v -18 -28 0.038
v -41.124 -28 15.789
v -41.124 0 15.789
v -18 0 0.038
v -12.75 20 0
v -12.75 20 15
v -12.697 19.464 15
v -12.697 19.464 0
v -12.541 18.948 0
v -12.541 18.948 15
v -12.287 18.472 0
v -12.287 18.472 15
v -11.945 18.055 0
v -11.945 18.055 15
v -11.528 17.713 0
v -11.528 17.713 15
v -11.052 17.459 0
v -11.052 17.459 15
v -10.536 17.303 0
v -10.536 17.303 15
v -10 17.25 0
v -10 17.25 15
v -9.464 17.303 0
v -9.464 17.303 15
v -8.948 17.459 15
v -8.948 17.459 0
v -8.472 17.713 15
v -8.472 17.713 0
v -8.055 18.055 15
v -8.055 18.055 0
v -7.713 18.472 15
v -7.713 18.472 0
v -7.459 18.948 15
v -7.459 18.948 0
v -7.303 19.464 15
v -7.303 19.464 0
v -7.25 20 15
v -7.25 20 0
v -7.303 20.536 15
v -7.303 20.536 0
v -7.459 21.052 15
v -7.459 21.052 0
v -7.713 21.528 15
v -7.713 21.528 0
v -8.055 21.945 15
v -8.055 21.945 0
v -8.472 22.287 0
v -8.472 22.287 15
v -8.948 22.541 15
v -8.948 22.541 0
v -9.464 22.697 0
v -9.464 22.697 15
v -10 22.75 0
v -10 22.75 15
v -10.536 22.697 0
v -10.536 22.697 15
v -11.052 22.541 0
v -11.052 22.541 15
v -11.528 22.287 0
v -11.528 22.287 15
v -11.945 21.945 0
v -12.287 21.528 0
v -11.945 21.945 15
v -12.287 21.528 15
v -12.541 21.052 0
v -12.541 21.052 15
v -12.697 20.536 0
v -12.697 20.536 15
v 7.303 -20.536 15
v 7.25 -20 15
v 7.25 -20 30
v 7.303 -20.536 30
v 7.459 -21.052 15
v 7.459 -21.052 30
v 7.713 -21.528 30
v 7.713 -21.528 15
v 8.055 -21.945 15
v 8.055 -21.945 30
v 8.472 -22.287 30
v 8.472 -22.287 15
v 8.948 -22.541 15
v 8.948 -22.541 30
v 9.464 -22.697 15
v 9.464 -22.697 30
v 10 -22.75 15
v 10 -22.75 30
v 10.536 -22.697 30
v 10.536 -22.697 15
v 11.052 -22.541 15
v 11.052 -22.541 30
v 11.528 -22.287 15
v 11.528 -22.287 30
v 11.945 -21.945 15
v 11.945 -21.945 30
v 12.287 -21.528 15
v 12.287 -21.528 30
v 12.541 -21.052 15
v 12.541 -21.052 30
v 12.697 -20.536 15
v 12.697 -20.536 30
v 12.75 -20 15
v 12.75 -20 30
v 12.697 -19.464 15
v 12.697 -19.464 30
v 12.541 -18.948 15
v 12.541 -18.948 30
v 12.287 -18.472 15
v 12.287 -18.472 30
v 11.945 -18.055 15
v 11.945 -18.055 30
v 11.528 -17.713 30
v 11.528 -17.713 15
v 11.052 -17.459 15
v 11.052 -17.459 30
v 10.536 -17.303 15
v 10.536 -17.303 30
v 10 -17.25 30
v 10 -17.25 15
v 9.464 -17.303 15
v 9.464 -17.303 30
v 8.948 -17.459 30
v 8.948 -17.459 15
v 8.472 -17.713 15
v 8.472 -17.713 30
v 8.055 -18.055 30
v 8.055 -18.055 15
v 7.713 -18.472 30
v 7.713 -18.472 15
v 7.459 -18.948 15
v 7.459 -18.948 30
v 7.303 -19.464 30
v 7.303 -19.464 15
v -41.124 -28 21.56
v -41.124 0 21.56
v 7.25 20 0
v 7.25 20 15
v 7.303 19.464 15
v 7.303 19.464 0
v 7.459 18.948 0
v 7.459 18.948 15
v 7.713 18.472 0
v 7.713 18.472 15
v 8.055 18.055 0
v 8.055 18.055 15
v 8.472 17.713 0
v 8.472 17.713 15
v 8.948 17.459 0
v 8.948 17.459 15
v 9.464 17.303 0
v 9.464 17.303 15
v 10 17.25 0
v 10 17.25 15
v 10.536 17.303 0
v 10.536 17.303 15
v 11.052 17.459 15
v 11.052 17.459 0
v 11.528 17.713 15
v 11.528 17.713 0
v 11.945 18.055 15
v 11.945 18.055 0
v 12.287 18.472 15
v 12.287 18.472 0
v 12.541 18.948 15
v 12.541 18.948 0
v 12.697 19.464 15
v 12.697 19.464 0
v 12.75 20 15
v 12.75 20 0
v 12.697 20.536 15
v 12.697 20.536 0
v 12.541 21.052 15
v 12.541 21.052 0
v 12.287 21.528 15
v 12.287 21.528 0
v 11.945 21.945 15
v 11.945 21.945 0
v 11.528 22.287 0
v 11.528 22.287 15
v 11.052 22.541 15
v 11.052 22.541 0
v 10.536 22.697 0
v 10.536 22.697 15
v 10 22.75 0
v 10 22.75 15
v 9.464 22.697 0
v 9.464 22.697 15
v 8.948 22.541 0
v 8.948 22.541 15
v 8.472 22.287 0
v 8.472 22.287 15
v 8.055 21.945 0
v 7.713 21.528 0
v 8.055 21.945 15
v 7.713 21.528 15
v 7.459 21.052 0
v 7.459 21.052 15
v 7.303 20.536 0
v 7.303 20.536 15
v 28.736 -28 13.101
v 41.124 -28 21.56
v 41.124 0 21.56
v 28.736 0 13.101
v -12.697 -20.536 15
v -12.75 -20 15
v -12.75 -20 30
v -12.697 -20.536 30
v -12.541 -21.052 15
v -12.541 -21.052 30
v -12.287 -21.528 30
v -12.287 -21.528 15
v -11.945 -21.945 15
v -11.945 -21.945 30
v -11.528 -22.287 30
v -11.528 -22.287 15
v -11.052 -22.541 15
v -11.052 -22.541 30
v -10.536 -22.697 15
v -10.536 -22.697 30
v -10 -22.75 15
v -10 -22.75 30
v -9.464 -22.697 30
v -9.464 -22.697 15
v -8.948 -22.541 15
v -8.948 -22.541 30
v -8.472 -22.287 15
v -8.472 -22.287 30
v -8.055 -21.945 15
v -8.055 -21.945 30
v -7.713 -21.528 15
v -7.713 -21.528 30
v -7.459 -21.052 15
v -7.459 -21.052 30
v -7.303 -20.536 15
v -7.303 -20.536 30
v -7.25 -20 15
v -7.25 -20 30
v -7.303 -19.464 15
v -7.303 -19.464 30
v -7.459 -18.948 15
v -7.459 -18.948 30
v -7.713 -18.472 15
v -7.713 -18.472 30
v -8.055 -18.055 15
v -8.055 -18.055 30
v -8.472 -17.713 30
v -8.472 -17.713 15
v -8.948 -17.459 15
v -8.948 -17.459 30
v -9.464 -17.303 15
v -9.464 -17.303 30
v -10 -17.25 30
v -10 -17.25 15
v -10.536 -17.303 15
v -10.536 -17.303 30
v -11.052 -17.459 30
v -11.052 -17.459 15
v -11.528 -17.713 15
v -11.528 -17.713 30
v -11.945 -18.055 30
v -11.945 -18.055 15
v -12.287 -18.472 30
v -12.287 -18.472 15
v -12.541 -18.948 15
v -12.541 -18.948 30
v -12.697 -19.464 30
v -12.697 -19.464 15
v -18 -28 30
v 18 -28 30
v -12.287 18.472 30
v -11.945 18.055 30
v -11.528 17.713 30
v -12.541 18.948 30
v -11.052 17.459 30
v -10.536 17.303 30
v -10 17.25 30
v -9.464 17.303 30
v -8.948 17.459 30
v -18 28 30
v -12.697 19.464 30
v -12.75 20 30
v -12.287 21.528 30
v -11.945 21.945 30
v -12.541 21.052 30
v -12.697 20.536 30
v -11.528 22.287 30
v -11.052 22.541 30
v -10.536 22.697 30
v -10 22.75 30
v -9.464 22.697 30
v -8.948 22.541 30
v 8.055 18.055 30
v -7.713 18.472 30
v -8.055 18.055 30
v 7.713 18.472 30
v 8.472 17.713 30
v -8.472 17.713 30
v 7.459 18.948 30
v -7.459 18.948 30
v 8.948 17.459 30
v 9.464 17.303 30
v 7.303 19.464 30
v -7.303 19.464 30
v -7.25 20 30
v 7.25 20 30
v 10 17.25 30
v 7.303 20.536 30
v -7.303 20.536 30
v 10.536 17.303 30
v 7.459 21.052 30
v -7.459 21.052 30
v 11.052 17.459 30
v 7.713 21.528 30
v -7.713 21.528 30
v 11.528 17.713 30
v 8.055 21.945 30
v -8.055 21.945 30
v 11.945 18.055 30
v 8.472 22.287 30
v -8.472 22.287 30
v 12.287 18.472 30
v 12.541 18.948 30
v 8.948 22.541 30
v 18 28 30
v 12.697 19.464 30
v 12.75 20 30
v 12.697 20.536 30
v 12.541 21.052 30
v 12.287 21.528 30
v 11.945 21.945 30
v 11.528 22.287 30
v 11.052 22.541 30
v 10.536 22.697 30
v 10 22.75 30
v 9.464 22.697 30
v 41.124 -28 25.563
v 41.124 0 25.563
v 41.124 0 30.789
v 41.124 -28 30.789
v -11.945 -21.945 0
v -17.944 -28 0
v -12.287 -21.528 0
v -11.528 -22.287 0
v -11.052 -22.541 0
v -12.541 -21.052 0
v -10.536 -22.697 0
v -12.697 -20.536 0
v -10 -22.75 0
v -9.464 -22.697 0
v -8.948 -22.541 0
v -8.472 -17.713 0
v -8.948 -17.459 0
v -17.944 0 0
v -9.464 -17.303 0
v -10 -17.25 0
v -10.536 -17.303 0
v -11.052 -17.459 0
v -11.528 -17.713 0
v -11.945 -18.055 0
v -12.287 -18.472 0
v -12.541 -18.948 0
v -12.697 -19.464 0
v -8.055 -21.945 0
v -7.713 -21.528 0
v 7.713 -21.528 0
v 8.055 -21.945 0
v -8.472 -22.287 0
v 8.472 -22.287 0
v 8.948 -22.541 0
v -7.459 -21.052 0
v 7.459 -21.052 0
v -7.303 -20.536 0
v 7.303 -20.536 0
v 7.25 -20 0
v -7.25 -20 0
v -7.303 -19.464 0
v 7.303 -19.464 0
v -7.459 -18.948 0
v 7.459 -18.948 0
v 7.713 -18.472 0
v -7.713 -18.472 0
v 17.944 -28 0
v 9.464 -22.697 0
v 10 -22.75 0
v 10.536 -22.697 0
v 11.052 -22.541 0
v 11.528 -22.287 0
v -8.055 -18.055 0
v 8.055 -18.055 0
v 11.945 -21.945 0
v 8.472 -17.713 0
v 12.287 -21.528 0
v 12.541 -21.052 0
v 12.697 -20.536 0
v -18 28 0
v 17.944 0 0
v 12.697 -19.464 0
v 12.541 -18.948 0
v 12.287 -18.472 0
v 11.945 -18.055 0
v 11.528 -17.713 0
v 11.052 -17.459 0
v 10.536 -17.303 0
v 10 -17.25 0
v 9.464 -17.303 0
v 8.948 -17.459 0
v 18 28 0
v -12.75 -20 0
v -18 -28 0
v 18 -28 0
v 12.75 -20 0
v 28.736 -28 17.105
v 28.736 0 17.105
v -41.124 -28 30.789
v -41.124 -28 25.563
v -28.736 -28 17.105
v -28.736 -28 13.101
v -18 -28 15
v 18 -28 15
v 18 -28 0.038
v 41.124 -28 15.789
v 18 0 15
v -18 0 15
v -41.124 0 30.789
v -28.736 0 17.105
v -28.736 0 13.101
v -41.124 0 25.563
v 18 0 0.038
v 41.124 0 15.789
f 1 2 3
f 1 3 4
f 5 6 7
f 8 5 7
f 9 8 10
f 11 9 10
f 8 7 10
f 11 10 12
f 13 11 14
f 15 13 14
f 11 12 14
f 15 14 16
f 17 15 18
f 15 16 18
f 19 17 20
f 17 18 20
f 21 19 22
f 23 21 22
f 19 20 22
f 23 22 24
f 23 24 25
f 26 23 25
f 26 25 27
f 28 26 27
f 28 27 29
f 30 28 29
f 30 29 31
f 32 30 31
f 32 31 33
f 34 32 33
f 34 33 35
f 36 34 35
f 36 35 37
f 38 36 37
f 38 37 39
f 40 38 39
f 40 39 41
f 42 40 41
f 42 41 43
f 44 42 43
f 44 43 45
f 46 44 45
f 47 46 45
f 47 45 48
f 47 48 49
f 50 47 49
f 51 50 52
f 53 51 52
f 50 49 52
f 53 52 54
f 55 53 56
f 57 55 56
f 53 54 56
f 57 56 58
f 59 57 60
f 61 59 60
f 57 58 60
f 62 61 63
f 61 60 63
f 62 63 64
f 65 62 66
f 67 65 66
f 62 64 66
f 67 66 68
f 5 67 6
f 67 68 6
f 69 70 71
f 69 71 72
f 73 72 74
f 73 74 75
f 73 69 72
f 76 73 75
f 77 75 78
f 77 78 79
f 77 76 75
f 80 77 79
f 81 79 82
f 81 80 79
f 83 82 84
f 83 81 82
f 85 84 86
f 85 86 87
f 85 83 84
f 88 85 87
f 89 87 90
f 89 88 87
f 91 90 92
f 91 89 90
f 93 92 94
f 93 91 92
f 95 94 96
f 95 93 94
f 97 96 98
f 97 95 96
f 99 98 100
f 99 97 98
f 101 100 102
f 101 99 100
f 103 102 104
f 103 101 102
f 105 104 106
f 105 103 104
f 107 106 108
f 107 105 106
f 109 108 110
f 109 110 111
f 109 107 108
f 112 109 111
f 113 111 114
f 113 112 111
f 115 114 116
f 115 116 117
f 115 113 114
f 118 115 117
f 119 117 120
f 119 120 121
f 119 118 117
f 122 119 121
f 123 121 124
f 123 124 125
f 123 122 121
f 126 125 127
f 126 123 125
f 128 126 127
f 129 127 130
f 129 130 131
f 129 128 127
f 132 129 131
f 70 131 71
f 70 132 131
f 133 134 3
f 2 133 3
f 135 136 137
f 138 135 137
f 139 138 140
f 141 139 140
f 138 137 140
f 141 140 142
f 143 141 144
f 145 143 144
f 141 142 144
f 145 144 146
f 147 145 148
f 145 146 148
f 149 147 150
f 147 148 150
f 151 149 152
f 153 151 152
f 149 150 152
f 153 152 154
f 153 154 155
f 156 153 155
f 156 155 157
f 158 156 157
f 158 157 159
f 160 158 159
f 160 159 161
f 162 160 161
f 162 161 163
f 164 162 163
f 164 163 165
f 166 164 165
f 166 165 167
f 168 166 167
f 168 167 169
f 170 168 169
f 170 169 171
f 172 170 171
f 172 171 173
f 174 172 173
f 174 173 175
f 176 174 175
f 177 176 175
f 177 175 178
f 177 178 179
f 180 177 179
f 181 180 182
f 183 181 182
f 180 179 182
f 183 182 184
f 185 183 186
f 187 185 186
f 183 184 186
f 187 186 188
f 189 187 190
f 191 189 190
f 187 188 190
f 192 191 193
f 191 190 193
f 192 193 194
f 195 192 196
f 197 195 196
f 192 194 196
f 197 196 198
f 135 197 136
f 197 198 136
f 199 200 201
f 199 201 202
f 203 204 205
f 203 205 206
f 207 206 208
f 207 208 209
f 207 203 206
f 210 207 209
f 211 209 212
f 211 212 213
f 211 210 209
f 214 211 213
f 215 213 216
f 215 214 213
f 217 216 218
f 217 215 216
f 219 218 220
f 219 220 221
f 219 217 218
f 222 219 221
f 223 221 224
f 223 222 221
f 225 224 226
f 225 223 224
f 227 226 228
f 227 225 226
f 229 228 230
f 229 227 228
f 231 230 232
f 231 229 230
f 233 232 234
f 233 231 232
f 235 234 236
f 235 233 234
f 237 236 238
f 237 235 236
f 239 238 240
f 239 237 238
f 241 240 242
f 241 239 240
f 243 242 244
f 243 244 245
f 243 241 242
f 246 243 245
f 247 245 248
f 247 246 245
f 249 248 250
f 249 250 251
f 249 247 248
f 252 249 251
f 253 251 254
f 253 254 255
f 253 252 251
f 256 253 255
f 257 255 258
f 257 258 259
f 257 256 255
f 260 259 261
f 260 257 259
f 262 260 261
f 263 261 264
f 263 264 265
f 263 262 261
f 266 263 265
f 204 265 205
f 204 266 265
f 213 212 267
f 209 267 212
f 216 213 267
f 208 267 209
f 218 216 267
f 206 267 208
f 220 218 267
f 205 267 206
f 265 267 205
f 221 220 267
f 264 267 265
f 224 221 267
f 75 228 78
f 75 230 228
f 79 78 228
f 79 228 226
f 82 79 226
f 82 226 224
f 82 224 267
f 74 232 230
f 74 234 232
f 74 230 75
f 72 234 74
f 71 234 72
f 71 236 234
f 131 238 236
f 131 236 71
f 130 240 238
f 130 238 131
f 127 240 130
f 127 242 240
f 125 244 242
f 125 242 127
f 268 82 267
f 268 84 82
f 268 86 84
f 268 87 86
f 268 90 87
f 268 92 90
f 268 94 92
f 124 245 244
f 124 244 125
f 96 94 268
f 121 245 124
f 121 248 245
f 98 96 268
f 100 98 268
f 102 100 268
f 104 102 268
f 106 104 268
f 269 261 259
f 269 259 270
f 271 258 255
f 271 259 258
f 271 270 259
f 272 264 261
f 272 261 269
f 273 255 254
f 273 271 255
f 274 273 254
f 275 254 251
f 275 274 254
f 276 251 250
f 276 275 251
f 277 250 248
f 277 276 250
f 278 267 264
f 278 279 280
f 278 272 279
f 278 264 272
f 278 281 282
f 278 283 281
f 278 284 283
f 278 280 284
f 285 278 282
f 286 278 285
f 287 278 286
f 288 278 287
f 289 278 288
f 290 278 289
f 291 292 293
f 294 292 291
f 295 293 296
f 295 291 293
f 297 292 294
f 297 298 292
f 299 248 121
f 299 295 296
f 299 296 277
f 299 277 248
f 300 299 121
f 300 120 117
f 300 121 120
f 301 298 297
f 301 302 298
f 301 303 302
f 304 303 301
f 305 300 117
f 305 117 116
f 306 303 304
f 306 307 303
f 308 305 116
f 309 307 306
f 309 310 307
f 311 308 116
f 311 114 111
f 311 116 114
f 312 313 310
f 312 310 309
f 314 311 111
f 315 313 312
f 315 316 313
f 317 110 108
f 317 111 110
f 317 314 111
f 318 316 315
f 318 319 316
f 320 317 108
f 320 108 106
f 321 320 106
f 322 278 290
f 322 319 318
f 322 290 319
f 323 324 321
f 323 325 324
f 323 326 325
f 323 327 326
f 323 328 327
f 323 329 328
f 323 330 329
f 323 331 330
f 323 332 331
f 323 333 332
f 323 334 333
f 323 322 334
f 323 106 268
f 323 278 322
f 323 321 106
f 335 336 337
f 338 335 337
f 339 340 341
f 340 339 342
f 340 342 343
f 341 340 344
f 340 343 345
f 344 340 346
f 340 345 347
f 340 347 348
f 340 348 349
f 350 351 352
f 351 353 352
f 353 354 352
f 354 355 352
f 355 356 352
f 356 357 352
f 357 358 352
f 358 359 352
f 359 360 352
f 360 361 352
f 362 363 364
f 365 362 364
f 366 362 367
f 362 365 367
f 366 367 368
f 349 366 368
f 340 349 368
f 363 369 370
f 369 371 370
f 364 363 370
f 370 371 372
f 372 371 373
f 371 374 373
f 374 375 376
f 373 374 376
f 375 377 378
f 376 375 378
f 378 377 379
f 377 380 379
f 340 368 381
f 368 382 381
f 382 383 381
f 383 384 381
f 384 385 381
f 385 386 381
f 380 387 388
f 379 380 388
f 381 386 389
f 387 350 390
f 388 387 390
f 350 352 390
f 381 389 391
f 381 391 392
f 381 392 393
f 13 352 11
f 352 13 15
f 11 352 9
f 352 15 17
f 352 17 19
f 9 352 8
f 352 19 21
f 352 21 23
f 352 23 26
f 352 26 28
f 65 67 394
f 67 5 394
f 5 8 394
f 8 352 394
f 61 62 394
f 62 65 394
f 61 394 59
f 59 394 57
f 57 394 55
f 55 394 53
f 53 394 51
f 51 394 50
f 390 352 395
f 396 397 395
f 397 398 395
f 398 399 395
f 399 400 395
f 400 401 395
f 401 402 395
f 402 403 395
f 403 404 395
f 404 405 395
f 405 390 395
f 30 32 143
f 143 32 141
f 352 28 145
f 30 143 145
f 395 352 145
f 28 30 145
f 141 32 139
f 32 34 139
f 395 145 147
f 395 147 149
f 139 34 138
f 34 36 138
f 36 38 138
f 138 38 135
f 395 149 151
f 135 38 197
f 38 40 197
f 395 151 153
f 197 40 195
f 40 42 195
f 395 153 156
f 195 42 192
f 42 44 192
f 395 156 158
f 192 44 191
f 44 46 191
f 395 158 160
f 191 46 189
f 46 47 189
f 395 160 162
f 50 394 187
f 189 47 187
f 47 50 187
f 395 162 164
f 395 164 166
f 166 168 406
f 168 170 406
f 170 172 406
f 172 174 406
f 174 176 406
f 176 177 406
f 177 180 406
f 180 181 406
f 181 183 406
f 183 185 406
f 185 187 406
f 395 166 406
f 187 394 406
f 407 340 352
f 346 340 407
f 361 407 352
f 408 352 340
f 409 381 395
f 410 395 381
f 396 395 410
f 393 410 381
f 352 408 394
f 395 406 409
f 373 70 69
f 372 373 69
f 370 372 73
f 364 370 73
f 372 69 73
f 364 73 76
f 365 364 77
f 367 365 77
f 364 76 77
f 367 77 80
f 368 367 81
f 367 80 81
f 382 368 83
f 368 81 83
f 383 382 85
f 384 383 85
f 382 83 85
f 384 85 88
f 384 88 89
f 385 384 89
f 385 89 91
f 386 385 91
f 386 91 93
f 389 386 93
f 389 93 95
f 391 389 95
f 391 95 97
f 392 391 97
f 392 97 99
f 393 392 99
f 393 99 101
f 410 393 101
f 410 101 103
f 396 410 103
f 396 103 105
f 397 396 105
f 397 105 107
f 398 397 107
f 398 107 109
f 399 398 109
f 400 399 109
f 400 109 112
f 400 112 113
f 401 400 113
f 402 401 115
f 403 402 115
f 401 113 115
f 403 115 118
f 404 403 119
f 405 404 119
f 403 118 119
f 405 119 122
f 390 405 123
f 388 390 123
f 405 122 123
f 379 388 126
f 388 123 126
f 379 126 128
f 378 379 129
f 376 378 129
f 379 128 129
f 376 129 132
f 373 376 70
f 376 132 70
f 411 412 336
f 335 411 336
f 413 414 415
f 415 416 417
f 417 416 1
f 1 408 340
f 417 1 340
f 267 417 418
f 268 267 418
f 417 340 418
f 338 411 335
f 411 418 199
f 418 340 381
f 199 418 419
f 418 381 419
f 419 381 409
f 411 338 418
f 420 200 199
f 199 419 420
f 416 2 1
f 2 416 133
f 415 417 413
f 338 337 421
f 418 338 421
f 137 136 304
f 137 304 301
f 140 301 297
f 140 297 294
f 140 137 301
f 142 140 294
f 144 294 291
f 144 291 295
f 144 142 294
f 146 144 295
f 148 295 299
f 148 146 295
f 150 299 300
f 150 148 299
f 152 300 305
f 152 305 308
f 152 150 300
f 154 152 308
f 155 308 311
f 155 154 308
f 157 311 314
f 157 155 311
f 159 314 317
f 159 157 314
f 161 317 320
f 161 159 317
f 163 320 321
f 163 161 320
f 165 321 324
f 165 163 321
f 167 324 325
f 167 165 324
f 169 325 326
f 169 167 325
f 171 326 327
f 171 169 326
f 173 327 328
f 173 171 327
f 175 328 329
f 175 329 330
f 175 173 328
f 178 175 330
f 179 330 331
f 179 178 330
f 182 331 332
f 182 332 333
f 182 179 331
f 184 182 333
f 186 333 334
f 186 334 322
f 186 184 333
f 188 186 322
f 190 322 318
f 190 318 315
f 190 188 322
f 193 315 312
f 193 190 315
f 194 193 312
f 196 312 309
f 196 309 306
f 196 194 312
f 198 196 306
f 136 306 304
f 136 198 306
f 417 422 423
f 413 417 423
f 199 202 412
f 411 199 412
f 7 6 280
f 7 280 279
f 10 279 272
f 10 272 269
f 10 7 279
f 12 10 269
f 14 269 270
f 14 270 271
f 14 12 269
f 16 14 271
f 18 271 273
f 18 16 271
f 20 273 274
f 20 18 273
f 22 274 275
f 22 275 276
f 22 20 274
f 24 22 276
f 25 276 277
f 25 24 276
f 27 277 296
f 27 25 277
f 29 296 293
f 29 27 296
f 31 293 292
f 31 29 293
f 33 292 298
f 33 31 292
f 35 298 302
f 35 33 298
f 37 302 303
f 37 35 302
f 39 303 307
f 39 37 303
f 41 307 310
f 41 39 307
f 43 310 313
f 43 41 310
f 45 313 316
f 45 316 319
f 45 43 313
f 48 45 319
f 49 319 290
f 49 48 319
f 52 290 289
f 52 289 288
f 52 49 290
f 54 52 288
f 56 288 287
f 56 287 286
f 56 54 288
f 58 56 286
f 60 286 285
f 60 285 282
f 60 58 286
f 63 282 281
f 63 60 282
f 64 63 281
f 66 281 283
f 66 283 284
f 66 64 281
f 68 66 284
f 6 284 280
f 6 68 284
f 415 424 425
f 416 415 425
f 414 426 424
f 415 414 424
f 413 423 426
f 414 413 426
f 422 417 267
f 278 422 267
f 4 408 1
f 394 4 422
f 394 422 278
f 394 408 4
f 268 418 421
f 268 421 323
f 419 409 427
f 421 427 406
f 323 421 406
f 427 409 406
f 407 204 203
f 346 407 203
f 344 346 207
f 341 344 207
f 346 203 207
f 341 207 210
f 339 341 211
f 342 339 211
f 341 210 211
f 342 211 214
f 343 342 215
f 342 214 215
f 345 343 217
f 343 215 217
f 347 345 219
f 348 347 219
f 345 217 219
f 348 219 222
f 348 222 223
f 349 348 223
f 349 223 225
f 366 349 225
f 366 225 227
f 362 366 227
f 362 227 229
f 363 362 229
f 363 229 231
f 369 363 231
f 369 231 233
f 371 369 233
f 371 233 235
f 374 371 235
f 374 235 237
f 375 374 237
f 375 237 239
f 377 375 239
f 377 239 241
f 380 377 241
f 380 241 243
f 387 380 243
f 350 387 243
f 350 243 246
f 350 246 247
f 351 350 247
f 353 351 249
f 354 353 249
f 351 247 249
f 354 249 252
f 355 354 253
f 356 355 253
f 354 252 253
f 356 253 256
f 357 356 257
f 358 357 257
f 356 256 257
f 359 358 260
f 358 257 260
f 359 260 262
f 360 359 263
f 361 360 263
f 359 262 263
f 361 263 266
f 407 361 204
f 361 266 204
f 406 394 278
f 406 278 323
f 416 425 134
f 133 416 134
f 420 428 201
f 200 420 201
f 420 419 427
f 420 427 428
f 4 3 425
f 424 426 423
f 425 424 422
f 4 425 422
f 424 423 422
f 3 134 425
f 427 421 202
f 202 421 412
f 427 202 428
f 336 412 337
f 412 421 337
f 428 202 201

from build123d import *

# Parameters (mm, degrees)
F0_W     = 36
F0_H     = 56
F1_DEPTH = 15
F3_DEPTH = 28
F4_D     = 5.5
F5_DEPTH = 15


with BuildPart() as f1:
    # F0 (on Top) → F1 (new body)
    with BuildSketch(Plane.XY):
        Rectangle(F0_W, F0_H)
    extrude(amount=F1_DEPTH)

    # F2 (on Front) → F3 (join)
    with BuildSketch(Plane.XZ):
        Polygon((-17.9443880916, 0), (-18, 15), (-41.1238394028, 30.7888584537), (-41.1238394028, 25.5634840578), (-28.7360682942, 17.105167029), (-28.7360682942, 13.1013058126), (-41.1238394028, 21.5596228414), (-41.1238394028, 15.7888584537), align=None)
        Polygon((28.7360682942, 17.105167029), (41.1238394028, 25.5634840578), (41.1238394028, 30.7888584537), (18, 15), (17.9443880916, 0), (41.1238394028, 15.7888584537), (41.1238394028, 21.5596228414), (28.7360682942, 13.1013058126), align=None)
    extrude(amount=F3_DEPTH)

    # F4 (through all)
    with Locations(Plane(origin=(0, 0, 0), x_dir=(1, 0, 0), z_dir=(0, 0, -1))):
        with Locations((-10, 20), (10, 20), (10, -20), (-10, -20)):
            Hole(F4_D / 2)

    # F5 (add): a face of the model
    f5_faces = [f1.faces().sort_by_distance(p)[0] for p in [
        (0, 0, 15),
    ]]
    extrude(f5_faces, amount=F5_DEPTH)


solid = f1.part
